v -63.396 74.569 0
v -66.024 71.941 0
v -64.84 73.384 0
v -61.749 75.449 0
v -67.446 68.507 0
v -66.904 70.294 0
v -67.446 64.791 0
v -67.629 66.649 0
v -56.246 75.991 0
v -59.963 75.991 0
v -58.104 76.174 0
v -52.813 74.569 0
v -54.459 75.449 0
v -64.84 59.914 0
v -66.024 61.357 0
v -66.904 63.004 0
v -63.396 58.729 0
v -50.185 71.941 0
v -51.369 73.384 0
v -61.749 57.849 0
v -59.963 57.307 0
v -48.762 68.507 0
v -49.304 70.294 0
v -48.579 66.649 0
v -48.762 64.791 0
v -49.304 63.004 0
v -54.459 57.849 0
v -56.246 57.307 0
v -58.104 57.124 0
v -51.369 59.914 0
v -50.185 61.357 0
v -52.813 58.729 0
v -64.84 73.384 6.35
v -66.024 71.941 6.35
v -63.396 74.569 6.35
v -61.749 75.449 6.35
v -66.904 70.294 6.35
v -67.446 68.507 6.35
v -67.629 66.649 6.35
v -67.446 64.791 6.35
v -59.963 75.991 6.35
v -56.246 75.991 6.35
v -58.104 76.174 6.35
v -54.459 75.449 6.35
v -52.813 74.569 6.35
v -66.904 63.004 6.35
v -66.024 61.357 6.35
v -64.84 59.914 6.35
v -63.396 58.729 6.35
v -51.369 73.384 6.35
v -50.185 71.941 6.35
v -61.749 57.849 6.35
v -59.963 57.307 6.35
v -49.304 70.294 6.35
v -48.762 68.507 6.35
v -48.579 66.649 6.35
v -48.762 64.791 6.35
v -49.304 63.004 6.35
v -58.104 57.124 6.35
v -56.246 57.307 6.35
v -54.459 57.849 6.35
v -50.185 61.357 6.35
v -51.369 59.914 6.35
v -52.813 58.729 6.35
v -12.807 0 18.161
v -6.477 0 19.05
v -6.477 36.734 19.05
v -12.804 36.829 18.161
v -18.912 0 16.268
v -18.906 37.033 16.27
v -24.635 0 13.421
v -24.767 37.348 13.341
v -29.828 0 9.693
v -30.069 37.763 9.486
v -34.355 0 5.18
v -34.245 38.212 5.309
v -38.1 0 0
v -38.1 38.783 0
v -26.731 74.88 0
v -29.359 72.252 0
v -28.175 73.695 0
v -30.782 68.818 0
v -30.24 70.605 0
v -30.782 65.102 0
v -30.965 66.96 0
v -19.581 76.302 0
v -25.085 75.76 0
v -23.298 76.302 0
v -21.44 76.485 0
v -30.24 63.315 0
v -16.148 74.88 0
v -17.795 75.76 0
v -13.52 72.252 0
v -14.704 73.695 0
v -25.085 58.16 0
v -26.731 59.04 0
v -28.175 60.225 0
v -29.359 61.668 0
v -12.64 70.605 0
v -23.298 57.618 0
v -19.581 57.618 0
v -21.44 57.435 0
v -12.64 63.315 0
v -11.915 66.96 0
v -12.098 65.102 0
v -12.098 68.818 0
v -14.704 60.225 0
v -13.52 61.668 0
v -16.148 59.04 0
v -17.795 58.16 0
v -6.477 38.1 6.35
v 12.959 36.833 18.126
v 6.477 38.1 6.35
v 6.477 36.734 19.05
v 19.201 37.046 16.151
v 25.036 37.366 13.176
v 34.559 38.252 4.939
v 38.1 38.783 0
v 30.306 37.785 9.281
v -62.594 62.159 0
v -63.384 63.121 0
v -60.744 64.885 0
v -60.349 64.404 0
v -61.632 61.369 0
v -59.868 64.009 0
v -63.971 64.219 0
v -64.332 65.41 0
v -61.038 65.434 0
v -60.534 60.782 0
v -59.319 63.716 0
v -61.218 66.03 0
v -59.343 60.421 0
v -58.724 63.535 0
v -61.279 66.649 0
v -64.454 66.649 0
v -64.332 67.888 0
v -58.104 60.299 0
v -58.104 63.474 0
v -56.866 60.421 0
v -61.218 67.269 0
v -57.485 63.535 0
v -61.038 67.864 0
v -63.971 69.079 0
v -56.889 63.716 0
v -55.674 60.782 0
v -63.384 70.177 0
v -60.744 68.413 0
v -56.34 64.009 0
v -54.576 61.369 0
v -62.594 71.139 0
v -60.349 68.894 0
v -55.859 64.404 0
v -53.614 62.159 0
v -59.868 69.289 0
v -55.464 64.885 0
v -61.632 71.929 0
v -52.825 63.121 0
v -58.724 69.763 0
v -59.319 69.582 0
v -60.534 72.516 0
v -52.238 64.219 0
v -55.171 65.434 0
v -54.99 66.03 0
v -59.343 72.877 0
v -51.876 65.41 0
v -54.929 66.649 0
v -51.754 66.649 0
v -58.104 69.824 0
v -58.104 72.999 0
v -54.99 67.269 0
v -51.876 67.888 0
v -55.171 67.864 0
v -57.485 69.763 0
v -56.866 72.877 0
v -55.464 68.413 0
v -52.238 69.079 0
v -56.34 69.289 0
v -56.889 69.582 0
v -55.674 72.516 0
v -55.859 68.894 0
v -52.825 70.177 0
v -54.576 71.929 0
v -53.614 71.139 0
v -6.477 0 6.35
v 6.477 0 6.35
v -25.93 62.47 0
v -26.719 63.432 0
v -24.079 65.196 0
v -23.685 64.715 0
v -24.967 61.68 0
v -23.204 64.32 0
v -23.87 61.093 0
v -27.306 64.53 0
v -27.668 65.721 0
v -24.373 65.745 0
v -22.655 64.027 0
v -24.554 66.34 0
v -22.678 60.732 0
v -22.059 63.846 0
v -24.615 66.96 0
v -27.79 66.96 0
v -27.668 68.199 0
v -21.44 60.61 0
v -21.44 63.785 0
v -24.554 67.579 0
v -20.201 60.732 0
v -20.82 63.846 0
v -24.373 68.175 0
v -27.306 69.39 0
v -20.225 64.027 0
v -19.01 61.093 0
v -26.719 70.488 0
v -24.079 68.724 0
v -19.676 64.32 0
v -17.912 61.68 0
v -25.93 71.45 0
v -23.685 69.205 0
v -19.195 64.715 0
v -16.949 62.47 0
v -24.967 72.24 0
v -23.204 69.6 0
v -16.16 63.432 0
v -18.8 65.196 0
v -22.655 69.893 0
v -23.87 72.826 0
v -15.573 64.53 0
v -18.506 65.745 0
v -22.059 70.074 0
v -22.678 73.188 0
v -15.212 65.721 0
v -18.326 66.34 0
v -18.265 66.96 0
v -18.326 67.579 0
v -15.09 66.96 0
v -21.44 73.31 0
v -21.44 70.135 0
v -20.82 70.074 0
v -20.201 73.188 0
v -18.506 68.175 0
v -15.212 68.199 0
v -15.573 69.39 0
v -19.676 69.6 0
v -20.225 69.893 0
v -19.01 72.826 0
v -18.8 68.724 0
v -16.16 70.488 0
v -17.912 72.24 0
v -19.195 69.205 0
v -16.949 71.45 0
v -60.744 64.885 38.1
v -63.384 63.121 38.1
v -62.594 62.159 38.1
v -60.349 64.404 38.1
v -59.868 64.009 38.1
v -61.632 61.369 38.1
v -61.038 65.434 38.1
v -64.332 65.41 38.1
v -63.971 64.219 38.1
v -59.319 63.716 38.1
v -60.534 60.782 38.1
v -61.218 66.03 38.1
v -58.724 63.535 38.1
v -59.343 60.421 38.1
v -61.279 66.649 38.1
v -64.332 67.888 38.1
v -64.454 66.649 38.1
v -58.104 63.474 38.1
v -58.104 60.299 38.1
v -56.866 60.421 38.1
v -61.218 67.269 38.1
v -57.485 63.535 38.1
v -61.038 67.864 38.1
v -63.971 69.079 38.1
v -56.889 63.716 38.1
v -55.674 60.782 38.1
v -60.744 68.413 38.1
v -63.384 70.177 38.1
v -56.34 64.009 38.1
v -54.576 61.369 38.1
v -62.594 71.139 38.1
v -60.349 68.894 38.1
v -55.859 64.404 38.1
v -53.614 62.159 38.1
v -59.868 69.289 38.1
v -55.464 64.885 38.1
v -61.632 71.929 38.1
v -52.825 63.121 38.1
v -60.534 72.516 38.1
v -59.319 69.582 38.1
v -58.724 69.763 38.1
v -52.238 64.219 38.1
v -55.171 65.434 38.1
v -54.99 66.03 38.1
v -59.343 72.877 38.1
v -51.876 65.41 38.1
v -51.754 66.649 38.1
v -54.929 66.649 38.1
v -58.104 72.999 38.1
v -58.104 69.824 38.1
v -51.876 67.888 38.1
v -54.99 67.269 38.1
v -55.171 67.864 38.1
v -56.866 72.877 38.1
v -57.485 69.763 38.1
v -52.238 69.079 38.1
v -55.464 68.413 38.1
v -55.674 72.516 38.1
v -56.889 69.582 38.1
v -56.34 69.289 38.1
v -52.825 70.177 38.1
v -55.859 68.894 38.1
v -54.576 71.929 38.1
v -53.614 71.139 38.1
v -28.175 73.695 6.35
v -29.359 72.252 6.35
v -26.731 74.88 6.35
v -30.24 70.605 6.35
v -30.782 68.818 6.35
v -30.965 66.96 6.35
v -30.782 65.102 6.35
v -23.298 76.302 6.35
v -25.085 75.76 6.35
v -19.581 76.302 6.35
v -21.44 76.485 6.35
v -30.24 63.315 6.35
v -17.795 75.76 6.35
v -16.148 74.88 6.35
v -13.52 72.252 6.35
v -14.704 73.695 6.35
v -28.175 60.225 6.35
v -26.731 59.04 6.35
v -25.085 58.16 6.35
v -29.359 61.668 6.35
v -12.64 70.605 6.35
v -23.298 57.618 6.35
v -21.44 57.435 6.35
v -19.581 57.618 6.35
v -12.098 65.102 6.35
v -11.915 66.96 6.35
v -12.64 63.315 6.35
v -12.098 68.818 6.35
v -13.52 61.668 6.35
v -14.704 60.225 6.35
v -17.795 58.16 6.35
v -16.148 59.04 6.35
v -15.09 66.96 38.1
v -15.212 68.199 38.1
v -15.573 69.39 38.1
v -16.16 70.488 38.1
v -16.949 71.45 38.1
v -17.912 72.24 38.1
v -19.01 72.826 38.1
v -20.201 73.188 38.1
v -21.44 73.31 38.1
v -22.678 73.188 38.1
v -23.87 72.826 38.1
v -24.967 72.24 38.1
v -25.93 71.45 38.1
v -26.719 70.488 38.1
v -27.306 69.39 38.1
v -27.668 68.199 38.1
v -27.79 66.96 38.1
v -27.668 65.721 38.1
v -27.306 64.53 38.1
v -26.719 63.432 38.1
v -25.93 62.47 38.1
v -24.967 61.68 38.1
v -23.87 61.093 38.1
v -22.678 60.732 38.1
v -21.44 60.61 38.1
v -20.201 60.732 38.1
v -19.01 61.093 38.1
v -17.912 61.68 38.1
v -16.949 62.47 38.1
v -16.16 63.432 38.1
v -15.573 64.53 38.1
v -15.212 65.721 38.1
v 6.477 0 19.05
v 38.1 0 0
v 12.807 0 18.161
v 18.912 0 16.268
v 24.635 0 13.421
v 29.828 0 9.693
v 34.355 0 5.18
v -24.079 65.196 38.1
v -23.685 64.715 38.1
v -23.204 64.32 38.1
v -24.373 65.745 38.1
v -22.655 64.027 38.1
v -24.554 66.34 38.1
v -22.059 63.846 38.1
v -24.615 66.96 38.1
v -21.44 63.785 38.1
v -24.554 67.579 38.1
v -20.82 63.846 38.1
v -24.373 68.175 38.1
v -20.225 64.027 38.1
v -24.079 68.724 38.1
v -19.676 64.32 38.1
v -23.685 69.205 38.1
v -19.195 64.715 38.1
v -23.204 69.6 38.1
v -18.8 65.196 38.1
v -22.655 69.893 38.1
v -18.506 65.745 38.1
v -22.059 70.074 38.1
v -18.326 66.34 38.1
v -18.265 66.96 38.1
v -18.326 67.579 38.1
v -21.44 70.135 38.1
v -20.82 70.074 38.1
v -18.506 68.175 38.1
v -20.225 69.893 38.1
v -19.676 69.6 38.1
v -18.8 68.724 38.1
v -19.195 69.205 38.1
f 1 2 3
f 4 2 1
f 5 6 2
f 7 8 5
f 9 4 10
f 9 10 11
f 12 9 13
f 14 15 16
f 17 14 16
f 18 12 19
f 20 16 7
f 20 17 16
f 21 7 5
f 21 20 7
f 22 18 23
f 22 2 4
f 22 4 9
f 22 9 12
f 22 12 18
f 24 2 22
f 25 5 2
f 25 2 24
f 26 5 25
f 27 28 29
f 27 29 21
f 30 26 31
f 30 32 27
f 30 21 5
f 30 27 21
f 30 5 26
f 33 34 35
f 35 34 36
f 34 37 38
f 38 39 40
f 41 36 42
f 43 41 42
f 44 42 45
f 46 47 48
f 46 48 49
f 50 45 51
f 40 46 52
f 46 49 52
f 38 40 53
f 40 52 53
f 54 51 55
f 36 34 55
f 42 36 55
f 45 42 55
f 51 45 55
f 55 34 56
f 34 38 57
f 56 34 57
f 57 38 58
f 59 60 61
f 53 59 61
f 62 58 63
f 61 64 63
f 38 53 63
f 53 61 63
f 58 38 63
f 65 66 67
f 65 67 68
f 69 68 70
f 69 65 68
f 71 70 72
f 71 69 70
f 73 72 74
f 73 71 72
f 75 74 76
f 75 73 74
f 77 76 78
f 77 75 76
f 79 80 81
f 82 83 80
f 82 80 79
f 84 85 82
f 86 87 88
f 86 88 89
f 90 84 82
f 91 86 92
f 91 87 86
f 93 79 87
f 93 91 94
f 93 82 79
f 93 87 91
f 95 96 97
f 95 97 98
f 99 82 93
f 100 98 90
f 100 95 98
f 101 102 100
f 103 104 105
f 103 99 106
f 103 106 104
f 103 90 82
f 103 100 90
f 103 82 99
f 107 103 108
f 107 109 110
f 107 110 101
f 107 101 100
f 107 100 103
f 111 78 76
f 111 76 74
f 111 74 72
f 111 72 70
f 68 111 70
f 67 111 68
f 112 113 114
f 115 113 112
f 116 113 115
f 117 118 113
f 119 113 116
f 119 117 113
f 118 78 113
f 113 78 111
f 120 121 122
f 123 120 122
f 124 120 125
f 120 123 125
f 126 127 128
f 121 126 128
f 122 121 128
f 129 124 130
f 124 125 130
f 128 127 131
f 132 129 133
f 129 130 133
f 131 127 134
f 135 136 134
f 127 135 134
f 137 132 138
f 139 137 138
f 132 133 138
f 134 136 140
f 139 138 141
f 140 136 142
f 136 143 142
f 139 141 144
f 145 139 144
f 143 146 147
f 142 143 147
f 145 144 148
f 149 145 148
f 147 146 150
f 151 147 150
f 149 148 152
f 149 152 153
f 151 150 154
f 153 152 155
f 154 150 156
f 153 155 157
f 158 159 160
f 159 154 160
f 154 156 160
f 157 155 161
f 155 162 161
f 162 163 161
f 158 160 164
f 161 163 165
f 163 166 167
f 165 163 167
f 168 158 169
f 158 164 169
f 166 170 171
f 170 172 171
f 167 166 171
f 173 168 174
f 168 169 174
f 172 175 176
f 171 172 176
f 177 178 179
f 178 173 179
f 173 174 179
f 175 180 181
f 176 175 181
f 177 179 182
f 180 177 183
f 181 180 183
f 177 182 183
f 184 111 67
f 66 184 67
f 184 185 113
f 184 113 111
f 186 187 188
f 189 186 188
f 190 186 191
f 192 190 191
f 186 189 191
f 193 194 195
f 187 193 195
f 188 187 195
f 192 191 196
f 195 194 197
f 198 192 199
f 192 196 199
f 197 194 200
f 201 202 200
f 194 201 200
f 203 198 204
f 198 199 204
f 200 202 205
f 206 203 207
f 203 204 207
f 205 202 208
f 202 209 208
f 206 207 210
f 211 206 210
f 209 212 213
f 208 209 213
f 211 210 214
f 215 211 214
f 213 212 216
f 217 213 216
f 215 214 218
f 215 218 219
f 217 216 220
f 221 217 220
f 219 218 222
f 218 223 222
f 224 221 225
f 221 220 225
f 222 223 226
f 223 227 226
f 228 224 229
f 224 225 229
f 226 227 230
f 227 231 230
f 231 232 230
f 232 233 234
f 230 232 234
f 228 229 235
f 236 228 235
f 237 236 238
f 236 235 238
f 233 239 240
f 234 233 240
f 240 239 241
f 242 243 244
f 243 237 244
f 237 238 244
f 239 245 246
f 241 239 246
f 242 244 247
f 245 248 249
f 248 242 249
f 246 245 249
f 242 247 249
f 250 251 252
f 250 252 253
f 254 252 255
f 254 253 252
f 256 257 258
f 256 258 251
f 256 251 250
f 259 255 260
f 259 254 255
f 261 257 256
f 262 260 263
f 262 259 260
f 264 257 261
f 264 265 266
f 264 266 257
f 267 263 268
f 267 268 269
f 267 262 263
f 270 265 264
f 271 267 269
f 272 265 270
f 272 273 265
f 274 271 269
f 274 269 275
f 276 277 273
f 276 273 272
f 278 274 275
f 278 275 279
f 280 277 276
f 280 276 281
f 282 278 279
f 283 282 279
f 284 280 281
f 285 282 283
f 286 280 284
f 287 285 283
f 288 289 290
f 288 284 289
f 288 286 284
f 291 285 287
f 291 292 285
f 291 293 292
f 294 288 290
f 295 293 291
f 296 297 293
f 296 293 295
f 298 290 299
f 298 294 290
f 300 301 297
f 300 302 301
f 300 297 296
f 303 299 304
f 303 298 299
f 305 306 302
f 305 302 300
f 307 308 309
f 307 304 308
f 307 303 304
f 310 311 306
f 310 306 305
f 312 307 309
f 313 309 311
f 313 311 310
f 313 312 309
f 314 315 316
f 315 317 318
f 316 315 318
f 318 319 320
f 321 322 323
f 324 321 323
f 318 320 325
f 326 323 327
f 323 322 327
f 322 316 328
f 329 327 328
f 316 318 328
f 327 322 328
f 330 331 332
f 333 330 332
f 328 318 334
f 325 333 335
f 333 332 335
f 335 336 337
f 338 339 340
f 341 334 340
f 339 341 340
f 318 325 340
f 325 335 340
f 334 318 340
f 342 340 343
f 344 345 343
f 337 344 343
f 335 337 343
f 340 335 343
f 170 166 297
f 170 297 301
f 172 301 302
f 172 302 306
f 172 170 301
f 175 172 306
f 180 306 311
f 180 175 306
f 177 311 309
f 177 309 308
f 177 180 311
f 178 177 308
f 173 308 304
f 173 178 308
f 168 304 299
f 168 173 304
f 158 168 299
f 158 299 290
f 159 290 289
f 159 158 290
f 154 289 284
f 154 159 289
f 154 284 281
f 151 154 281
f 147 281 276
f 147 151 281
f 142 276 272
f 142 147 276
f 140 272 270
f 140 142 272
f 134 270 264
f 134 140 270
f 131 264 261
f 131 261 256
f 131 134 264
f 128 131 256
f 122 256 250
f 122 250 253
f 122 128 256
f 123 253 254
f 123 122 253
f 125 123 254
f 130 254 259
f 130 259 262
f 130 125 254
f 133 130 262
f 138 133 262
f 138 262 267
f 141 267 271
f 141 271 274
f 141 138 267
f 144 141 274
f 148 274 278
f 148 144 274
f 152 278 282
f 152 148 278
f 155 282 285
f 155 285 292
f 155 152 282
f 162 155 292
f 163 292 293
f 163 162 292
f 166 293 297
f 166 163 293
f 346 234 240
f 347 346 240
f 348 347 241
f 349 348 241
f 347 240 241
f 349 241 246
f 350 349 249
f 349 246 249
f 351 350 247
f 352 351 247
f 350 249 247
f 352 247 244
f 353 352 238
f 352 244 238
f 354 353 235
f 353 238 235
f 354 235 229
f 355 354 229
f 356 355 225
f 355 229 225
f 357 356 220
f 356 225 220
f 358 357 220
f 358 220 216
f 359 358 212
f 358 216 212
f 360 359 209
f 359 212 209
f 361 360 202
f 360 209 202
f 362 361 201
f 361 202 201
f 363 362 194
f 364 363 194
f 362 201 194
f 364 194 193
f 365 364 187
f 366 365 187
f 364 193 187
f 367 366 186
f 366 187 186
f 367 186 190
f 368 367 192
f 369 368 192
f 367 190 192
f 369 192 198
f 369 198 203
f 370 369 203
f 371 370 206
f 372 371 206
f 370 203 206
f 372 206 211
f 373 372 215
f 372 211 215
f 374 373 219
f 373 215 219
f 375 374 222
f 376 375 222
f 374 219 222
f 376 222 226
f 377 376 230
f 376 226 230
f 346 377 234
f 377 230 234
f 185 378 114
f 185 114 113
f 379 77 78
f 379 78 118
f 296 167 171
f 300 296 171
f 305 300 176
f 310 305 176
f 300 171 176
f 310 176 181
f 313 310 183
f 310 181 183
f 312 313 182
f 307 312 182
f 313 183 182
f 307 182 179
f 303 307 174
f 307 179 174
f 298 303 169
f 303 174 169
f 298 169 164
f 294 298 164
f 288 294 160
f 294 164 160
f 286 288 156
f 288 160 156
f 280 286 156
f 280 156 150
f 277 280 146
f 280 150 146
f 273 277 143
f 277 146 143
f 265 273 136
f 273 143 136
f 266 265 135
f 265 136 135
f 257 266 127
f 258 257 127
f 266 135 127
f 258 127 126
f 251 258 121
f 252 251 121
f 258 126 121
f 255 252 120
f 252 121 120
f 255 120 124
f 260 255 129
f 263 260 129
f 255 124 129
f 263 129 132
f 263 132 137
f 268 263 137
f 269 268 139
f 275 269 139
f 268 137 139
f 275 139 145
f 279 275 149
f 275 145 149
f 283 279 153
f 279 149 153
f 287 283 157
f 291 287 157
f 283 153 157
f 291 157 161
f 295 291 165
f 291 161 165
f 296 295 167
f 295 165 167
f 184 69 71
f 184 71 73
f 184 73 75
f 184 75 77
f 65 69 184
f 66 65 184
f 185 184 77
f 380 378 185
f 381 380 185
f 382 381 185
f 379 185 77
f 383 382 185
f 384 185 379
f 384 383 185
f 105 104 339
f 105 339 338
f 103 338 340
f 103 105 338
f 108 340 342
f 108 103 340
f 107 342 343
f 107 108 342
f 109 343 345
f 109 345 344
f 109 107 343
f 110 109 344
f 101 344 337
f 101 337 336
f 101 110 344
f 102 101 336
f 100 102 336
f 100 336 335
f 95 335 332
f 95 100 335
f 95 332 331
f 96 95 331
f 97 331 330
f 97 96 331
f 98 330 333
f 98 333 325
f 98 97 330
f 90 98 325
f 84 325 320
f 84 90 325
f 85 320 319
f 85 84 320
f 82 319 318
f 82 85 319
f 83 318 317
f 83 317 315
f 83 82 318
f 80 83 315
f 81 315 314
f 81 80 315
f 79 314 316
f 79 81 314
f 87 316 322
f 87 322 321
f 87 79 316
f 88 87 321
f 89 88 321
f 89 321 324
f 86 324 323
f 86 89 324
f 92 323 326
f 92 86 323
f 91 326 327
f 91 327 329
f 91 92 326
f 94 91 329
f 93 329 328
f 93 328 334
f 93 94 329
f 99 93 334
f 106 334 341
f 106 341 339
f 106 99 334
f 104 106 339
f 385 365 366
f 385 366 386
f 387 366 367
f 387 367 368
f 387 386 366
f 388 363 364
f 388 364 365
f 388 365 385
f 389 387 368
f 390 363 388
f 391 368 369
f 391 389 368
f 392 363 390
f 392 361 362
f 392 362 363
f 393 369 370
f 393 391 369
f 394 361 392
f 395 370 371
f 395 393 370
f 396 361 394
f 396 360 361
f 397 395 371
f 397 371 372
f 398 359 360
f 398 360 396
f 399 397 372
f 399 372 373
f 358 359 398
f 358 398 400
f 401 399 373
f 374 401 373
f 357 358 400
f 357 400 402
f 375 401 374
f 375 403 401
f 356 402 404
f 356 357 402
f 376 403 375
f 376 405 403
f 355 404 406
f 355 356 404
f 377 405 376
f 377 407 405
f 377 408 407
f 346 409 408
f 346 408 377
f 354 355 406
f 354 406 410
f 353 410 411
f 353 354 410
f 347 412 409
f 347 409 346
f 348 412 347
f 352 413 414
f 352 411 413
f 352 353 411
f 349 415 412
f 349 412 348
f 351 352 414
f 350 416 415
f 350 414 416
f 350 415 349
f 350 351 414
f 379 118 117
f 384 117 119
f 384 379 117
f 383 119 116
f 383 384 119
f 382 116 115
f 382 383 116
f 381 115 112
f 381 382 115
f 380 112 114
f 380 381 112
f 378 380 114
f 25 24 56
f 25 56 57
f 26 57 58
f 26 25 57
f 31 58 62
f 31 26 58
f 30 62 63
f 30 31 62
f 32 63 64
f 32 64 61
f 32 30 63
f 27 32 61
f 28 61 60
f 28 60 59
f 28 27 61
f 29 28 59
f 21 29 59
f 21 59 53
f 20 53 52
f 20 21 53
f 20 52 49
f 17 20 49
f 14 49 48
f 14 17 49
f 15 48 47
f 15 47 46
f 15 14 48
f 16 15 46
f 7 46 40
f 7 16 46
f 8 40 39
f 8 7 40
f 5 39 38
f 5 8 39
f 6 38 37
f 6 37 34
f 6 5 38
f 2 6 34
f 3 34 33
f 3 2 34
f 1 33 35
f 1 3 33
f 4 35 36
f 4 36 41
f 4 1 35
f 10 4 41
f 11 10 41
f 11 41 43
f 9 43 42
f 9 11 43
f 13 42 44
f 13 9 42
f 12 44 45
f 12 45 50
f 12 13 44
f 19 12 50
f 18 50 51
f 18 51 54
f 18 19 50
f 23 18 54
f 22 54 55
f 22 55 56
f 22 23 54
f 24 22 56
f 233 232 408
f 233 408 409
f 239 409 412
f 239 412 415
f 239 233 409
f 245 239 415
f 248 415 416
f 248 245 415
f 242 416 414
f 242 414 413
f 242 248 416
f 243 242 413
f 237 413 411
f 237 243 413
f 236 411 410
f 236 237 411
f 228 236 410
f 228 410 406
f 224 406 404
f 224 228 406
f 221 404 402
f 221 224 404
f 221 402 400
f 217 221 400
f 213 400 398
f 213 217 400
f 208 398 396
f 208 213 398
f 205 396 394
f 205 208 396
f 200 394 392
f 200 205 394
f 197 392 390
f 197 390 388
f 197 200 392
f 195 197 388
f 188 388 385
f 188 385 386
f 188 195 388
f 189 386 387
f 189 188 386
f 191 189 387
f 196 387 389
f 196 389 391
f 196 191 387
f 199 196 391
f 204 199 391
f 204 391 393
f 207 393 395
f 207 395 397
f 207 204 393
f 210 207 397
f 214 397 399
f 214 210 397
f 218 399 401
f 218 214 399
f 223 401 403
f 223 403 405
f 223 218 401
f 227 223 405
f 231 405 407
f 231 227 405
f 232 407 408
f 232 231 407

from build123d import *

# Parameters (mm, degrees)
F3_REACH = 81.3802869415
F4_R     = 6.35
F4_R_2   = 3.175
F5_DEPTH = 38.1
F6_R     = 9.525
F7_DEPTH = 6.35


with BuildPart() as f3:
    f3_end = Plane(origin=(0, 38.339396032, 4.1249082693), x_dir=(0, -0.1069719436, 0.9942620395), z_dir=(0, 0.9942620395, 0.1069719436))
    # F1 (on Front) → F3 (new body, up to a plane its end follows)
    with BuildSketch(Plane.XZ):
        with BuildLine():
            Line((0, 6.35), (0, 0))
            Line((0, 0), (38.1, 0))
            ThreePointArc((38.1, 0), (24.6352816359, 13.4206575155), (6.477, 19.05))
            Line((6.477, 19.05), (6.477, 6.35))
            Line((6.477, 6.35), (0, 6.35))
        make_face()
        with BuildLine():
            Line((-38.1, 0), (0, 0))
            Line((0, 0), (0, 6.35))
            Line((0, 6.35), (-6.477, 6.35))
            Line((-6.477, 6.35), (-6.477, 19.05))
            ThreePointArc((-6.477, 19.05), (-24.6352816359, 13.4206575155), (-38.1, 0))
        make_face()
    f3_long = extrude(amount=-F3_REACH, mode=Mode.PRIVATE)
    add(split(f3_long, bisect_by=f3_end, keep=Keep.BOTTOM, mode=Mode.PRIVATE))


with BuildPart() as f5:
    # F4 (on Top) → F5 (new body)
    with BuildSketch(Plane.XY):
        with Locations((-58.1043511629, 66.6491091251)):
            Circle(F4_R)
        with Locations((-58.1043511629, 66.6491091251)):
            Circle(F4_R_2, mode=Mode.SUBTRACT)
    extrude(amount=F5_DEPTH)


with BuildPart() as f5b:
    # F4 (on Top) → F5, piece 2 (new body)
    with BuildSketch(Plane.XY):
        with Locations((-21.4395727962, 66.9598281384)):
            Circle(F4_R)
        with Locations((-21.4395727962, 66.9598281384)):
            Circle(F4_R_2, mode=Mode.SUBTRACT)
    extrude(amount=F5_DEPTH)


with BuildPart() as f7:
    # F6 (on face) → F7 (new body)
    with BuildSketch(Plane(origin=(0, 0, 0), x_dir=(1, 0, 0), z_dir=(0, 0, -1))):
        with Locations((-58.1043511629, -66.6491091251)):
            Circle(F6_R)
    extrude(amount=-F7_DEPTH)


with BuildPart() as f7b:
    # F6 (on face) → F7, piece 2 (new body)
    with BuildSketch(Plane(origin=(0, 0, 0), x_dir=(1, 0, 0), z_dir=(0, 0, -1))):
        with Locations((-21.4395727962, -66.9598281384)):
            Circle(F6_R)
    extrude(amount=-F7_DEPTH)


solid = Compound([f3.part, f5.part, f5b.part, f7.part, f7b.part])
